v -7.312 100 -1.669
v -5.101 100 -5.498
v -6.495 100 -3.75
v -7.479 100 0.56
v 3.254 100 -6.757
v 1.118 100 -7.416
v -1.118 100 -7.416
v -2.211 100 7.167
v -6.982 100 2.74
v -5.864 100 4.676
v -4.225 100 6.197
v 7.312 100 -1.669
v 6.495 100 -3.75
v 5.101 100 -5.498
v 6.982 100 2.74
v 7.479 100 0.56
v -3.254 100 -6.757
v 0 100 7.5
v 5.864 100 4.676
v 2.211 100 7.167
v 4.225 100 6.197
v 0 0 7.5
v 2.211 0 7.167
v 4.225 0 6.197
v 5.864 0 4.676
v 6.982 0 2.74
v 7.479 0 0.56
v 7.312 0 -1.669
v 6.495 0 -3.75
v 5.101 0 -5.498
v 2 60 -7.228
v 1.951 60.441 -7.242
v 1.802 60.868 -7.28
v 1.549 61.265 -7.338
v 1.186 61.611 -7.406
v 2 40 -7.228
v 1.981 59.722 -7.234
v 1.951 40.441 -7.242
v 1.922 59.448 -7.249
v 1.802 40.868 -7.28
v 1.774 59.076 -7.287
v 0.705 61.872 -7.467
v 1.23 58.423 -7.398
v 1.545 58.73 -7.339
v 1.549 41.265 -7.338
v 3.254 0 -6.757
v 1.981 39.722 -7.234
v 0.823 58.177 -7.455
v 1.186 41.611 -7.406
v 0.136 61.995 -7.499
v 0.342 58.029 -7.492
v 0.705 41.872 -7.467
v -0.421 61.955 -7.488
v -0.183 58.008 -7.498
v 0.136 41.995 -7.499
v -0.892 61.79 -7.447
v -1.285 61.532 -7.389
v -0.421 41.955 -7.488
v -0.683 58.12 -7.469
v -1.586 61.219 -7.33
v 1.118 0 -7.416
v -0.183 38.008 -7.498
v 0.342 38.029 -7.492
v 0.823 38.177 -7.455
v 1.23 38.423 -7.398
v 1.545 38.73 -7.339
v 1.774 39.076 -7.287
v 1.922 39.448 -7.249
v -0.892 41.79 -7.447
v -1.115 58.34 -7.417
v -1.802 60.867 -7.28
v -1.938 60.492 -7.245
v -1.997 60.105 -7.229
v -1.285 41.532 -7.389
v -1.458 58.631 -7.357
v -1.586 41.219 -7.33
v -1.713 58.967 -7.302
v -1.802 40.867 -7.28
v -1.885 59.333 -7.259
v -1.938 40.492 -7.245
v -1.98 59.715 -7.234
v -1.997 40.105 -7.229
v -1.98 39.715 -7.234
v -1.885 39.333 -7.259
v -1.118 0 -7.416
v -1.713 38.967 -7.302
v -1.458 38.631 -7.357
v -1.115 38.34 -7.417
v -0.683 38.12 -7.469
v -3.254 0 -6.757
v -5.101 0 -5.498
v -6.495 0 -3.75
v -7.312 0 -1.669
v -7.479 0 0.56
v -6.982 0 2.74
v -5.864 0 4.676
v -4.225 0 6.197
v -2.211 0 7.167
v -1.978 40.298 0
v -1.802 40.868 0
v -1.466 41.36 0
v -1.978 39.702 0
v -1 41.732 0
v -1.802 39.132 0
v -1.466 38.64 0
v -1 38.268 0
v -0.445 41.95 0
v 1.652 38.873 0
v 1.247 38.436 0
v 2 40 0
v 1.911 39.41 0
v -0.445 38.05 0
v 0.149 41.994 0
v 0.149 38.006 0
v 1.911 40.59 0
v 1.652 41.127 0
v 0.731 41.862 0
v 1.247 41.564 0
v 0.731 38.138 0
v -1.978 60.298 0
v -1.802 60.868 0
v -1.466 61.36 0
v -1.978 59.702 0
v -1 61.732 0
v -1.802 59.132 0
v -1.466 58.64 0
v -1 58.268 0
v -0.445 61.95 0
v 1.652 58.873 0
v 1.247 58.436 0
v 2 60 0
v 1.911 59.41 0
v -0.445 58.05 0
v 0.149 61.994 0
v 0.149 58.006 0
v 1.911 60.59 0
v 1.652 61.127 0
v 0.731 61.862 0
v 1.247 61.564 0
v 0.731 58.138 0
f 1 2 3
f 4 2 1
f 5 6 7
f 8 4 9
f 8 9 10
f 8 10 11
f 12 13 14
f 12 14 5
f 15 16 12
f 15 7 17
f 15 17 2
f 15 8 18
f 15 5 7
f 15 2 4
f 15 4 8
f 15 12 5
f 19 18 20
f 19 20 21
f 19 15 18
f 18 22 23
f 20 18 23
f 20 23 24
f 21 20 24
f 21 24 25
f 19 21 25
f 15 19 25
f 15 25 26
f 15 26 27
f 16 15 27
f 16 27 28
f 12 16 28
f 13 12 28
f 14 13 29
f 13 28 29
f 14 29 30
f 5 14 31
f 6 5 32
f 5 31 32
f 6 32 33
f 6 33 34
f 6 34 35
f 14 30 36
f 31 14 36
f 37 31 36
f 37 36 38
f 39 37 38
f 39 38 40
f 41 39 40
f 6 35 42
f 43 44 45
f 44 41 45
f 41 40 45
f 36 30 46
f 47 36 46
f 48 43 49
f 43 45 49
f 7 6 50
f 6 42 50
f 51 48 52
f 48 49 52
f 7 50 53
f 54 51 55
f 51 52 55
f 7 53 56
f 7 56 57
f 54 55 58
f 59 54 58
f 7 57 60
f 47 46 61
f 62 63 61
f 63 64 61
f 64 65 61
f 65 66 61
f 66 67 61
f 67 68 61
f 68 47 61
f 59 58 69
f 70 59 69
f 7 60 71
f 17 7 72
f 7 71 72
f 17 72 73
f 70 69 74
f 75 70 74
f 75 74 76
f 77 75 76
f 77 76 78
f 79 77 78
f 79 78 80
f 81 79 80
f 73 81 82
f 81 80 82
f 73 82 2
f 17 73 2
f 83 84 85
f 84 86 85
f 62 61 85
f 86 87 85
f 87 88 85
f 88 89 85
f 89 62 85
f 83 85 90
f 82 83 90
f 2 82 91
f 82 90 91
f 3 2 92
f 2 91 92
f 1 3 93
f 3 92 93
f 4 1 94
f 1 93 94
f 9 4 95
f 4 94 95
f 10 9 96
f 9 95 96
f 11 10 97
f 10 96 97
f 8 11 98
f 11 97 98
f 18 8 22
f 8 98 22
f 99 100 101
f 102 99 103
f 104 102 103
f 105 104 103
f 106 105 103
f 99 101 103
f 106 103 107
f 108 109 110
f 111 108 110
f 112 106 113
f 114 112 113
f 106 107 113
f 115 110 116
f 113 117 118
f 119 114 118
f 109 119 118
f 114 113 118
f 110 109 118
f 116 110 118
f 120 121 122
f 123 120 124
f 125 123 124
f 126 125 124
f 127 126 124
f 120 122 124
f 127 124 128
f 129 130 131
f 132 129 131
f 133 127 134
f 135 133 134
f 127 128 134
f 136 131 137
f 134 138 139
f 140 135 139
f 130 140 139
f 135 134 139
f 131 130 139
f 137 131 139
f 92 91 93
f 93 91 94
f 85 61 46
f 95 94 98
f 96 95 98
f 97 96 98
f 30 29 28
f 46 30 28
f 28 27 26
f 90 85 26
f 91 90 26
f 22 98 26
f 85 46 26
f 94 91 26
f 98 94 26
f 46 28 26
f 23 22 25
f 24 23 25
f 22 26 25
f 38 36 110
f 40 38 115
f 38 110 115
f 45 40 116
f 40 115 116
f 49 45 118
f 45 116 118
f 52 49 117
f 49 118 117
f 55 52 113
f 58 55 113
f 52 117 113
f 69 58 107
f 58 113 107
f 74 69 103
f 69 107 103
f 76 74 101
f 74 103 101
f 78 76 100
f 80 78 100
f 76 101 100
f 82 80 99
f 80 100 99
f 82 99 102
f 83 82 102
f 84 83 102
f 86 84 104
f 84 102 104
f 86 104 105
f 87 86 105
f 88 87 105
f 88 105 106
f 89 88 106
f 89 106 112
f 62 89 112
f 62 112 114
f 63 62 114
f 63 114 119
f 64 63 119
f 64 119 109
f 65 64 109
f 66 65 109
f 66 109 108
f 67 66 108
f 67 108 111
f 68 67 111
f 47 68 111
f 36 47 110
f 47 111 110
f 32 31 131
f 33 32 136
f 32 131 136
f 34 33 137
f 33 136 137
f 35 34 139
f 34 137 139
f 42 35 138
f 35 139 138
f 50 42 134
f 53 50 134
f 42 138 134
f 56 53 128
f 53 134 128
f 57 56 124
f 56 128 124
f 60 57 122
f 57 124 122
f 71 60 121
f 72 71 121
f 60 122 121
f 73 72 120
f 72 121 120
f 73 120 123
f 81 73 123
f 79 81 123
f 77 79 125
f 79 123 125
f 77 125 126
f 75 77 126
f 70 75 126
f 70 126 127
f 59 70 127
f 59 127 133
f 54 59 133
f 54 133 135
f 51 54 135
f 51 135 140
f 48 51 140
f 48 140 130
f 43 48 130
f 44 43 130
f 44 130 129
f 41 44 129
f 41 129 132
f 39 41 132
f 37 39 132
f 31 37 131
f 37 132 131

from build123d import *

# Parameters (mm, degrees)
SKETCH_1_R          = 7.5
EXTRUDE_1_DEPTH     = 100
SKETCH_2_R          = 2
CUT_EXTRUDE_1_DEPTH = 10


with BuildPart() as part:
    # 스케치1 → 보스-돌출1 (new body)
    with BuildSketch(Plane(origin=(0, 0, 0), x_dir=(1, 0, 0), z_dir=(0, 1, 0))):
        with Locations(Location((0, 0, 0), (0, 0, 270))):
            Circle(SKETCH_1_R)
    extrude(amount=EXTRUDE_1_DEPTH)

    # 스케치2 → 컷-돌출1 (cut)
    with BuildSketch(Plane.XY):
        with Locations((0, 40)):
            Circle(SKETCH_2_R)
        with Locations((0, 60)):
            Circle(SKETCH_2_R)
    extrude(amount=-CUT_EXTRUDE_1_DEPTH, mode=Mode.SUBTRACT)


solid = part.part
